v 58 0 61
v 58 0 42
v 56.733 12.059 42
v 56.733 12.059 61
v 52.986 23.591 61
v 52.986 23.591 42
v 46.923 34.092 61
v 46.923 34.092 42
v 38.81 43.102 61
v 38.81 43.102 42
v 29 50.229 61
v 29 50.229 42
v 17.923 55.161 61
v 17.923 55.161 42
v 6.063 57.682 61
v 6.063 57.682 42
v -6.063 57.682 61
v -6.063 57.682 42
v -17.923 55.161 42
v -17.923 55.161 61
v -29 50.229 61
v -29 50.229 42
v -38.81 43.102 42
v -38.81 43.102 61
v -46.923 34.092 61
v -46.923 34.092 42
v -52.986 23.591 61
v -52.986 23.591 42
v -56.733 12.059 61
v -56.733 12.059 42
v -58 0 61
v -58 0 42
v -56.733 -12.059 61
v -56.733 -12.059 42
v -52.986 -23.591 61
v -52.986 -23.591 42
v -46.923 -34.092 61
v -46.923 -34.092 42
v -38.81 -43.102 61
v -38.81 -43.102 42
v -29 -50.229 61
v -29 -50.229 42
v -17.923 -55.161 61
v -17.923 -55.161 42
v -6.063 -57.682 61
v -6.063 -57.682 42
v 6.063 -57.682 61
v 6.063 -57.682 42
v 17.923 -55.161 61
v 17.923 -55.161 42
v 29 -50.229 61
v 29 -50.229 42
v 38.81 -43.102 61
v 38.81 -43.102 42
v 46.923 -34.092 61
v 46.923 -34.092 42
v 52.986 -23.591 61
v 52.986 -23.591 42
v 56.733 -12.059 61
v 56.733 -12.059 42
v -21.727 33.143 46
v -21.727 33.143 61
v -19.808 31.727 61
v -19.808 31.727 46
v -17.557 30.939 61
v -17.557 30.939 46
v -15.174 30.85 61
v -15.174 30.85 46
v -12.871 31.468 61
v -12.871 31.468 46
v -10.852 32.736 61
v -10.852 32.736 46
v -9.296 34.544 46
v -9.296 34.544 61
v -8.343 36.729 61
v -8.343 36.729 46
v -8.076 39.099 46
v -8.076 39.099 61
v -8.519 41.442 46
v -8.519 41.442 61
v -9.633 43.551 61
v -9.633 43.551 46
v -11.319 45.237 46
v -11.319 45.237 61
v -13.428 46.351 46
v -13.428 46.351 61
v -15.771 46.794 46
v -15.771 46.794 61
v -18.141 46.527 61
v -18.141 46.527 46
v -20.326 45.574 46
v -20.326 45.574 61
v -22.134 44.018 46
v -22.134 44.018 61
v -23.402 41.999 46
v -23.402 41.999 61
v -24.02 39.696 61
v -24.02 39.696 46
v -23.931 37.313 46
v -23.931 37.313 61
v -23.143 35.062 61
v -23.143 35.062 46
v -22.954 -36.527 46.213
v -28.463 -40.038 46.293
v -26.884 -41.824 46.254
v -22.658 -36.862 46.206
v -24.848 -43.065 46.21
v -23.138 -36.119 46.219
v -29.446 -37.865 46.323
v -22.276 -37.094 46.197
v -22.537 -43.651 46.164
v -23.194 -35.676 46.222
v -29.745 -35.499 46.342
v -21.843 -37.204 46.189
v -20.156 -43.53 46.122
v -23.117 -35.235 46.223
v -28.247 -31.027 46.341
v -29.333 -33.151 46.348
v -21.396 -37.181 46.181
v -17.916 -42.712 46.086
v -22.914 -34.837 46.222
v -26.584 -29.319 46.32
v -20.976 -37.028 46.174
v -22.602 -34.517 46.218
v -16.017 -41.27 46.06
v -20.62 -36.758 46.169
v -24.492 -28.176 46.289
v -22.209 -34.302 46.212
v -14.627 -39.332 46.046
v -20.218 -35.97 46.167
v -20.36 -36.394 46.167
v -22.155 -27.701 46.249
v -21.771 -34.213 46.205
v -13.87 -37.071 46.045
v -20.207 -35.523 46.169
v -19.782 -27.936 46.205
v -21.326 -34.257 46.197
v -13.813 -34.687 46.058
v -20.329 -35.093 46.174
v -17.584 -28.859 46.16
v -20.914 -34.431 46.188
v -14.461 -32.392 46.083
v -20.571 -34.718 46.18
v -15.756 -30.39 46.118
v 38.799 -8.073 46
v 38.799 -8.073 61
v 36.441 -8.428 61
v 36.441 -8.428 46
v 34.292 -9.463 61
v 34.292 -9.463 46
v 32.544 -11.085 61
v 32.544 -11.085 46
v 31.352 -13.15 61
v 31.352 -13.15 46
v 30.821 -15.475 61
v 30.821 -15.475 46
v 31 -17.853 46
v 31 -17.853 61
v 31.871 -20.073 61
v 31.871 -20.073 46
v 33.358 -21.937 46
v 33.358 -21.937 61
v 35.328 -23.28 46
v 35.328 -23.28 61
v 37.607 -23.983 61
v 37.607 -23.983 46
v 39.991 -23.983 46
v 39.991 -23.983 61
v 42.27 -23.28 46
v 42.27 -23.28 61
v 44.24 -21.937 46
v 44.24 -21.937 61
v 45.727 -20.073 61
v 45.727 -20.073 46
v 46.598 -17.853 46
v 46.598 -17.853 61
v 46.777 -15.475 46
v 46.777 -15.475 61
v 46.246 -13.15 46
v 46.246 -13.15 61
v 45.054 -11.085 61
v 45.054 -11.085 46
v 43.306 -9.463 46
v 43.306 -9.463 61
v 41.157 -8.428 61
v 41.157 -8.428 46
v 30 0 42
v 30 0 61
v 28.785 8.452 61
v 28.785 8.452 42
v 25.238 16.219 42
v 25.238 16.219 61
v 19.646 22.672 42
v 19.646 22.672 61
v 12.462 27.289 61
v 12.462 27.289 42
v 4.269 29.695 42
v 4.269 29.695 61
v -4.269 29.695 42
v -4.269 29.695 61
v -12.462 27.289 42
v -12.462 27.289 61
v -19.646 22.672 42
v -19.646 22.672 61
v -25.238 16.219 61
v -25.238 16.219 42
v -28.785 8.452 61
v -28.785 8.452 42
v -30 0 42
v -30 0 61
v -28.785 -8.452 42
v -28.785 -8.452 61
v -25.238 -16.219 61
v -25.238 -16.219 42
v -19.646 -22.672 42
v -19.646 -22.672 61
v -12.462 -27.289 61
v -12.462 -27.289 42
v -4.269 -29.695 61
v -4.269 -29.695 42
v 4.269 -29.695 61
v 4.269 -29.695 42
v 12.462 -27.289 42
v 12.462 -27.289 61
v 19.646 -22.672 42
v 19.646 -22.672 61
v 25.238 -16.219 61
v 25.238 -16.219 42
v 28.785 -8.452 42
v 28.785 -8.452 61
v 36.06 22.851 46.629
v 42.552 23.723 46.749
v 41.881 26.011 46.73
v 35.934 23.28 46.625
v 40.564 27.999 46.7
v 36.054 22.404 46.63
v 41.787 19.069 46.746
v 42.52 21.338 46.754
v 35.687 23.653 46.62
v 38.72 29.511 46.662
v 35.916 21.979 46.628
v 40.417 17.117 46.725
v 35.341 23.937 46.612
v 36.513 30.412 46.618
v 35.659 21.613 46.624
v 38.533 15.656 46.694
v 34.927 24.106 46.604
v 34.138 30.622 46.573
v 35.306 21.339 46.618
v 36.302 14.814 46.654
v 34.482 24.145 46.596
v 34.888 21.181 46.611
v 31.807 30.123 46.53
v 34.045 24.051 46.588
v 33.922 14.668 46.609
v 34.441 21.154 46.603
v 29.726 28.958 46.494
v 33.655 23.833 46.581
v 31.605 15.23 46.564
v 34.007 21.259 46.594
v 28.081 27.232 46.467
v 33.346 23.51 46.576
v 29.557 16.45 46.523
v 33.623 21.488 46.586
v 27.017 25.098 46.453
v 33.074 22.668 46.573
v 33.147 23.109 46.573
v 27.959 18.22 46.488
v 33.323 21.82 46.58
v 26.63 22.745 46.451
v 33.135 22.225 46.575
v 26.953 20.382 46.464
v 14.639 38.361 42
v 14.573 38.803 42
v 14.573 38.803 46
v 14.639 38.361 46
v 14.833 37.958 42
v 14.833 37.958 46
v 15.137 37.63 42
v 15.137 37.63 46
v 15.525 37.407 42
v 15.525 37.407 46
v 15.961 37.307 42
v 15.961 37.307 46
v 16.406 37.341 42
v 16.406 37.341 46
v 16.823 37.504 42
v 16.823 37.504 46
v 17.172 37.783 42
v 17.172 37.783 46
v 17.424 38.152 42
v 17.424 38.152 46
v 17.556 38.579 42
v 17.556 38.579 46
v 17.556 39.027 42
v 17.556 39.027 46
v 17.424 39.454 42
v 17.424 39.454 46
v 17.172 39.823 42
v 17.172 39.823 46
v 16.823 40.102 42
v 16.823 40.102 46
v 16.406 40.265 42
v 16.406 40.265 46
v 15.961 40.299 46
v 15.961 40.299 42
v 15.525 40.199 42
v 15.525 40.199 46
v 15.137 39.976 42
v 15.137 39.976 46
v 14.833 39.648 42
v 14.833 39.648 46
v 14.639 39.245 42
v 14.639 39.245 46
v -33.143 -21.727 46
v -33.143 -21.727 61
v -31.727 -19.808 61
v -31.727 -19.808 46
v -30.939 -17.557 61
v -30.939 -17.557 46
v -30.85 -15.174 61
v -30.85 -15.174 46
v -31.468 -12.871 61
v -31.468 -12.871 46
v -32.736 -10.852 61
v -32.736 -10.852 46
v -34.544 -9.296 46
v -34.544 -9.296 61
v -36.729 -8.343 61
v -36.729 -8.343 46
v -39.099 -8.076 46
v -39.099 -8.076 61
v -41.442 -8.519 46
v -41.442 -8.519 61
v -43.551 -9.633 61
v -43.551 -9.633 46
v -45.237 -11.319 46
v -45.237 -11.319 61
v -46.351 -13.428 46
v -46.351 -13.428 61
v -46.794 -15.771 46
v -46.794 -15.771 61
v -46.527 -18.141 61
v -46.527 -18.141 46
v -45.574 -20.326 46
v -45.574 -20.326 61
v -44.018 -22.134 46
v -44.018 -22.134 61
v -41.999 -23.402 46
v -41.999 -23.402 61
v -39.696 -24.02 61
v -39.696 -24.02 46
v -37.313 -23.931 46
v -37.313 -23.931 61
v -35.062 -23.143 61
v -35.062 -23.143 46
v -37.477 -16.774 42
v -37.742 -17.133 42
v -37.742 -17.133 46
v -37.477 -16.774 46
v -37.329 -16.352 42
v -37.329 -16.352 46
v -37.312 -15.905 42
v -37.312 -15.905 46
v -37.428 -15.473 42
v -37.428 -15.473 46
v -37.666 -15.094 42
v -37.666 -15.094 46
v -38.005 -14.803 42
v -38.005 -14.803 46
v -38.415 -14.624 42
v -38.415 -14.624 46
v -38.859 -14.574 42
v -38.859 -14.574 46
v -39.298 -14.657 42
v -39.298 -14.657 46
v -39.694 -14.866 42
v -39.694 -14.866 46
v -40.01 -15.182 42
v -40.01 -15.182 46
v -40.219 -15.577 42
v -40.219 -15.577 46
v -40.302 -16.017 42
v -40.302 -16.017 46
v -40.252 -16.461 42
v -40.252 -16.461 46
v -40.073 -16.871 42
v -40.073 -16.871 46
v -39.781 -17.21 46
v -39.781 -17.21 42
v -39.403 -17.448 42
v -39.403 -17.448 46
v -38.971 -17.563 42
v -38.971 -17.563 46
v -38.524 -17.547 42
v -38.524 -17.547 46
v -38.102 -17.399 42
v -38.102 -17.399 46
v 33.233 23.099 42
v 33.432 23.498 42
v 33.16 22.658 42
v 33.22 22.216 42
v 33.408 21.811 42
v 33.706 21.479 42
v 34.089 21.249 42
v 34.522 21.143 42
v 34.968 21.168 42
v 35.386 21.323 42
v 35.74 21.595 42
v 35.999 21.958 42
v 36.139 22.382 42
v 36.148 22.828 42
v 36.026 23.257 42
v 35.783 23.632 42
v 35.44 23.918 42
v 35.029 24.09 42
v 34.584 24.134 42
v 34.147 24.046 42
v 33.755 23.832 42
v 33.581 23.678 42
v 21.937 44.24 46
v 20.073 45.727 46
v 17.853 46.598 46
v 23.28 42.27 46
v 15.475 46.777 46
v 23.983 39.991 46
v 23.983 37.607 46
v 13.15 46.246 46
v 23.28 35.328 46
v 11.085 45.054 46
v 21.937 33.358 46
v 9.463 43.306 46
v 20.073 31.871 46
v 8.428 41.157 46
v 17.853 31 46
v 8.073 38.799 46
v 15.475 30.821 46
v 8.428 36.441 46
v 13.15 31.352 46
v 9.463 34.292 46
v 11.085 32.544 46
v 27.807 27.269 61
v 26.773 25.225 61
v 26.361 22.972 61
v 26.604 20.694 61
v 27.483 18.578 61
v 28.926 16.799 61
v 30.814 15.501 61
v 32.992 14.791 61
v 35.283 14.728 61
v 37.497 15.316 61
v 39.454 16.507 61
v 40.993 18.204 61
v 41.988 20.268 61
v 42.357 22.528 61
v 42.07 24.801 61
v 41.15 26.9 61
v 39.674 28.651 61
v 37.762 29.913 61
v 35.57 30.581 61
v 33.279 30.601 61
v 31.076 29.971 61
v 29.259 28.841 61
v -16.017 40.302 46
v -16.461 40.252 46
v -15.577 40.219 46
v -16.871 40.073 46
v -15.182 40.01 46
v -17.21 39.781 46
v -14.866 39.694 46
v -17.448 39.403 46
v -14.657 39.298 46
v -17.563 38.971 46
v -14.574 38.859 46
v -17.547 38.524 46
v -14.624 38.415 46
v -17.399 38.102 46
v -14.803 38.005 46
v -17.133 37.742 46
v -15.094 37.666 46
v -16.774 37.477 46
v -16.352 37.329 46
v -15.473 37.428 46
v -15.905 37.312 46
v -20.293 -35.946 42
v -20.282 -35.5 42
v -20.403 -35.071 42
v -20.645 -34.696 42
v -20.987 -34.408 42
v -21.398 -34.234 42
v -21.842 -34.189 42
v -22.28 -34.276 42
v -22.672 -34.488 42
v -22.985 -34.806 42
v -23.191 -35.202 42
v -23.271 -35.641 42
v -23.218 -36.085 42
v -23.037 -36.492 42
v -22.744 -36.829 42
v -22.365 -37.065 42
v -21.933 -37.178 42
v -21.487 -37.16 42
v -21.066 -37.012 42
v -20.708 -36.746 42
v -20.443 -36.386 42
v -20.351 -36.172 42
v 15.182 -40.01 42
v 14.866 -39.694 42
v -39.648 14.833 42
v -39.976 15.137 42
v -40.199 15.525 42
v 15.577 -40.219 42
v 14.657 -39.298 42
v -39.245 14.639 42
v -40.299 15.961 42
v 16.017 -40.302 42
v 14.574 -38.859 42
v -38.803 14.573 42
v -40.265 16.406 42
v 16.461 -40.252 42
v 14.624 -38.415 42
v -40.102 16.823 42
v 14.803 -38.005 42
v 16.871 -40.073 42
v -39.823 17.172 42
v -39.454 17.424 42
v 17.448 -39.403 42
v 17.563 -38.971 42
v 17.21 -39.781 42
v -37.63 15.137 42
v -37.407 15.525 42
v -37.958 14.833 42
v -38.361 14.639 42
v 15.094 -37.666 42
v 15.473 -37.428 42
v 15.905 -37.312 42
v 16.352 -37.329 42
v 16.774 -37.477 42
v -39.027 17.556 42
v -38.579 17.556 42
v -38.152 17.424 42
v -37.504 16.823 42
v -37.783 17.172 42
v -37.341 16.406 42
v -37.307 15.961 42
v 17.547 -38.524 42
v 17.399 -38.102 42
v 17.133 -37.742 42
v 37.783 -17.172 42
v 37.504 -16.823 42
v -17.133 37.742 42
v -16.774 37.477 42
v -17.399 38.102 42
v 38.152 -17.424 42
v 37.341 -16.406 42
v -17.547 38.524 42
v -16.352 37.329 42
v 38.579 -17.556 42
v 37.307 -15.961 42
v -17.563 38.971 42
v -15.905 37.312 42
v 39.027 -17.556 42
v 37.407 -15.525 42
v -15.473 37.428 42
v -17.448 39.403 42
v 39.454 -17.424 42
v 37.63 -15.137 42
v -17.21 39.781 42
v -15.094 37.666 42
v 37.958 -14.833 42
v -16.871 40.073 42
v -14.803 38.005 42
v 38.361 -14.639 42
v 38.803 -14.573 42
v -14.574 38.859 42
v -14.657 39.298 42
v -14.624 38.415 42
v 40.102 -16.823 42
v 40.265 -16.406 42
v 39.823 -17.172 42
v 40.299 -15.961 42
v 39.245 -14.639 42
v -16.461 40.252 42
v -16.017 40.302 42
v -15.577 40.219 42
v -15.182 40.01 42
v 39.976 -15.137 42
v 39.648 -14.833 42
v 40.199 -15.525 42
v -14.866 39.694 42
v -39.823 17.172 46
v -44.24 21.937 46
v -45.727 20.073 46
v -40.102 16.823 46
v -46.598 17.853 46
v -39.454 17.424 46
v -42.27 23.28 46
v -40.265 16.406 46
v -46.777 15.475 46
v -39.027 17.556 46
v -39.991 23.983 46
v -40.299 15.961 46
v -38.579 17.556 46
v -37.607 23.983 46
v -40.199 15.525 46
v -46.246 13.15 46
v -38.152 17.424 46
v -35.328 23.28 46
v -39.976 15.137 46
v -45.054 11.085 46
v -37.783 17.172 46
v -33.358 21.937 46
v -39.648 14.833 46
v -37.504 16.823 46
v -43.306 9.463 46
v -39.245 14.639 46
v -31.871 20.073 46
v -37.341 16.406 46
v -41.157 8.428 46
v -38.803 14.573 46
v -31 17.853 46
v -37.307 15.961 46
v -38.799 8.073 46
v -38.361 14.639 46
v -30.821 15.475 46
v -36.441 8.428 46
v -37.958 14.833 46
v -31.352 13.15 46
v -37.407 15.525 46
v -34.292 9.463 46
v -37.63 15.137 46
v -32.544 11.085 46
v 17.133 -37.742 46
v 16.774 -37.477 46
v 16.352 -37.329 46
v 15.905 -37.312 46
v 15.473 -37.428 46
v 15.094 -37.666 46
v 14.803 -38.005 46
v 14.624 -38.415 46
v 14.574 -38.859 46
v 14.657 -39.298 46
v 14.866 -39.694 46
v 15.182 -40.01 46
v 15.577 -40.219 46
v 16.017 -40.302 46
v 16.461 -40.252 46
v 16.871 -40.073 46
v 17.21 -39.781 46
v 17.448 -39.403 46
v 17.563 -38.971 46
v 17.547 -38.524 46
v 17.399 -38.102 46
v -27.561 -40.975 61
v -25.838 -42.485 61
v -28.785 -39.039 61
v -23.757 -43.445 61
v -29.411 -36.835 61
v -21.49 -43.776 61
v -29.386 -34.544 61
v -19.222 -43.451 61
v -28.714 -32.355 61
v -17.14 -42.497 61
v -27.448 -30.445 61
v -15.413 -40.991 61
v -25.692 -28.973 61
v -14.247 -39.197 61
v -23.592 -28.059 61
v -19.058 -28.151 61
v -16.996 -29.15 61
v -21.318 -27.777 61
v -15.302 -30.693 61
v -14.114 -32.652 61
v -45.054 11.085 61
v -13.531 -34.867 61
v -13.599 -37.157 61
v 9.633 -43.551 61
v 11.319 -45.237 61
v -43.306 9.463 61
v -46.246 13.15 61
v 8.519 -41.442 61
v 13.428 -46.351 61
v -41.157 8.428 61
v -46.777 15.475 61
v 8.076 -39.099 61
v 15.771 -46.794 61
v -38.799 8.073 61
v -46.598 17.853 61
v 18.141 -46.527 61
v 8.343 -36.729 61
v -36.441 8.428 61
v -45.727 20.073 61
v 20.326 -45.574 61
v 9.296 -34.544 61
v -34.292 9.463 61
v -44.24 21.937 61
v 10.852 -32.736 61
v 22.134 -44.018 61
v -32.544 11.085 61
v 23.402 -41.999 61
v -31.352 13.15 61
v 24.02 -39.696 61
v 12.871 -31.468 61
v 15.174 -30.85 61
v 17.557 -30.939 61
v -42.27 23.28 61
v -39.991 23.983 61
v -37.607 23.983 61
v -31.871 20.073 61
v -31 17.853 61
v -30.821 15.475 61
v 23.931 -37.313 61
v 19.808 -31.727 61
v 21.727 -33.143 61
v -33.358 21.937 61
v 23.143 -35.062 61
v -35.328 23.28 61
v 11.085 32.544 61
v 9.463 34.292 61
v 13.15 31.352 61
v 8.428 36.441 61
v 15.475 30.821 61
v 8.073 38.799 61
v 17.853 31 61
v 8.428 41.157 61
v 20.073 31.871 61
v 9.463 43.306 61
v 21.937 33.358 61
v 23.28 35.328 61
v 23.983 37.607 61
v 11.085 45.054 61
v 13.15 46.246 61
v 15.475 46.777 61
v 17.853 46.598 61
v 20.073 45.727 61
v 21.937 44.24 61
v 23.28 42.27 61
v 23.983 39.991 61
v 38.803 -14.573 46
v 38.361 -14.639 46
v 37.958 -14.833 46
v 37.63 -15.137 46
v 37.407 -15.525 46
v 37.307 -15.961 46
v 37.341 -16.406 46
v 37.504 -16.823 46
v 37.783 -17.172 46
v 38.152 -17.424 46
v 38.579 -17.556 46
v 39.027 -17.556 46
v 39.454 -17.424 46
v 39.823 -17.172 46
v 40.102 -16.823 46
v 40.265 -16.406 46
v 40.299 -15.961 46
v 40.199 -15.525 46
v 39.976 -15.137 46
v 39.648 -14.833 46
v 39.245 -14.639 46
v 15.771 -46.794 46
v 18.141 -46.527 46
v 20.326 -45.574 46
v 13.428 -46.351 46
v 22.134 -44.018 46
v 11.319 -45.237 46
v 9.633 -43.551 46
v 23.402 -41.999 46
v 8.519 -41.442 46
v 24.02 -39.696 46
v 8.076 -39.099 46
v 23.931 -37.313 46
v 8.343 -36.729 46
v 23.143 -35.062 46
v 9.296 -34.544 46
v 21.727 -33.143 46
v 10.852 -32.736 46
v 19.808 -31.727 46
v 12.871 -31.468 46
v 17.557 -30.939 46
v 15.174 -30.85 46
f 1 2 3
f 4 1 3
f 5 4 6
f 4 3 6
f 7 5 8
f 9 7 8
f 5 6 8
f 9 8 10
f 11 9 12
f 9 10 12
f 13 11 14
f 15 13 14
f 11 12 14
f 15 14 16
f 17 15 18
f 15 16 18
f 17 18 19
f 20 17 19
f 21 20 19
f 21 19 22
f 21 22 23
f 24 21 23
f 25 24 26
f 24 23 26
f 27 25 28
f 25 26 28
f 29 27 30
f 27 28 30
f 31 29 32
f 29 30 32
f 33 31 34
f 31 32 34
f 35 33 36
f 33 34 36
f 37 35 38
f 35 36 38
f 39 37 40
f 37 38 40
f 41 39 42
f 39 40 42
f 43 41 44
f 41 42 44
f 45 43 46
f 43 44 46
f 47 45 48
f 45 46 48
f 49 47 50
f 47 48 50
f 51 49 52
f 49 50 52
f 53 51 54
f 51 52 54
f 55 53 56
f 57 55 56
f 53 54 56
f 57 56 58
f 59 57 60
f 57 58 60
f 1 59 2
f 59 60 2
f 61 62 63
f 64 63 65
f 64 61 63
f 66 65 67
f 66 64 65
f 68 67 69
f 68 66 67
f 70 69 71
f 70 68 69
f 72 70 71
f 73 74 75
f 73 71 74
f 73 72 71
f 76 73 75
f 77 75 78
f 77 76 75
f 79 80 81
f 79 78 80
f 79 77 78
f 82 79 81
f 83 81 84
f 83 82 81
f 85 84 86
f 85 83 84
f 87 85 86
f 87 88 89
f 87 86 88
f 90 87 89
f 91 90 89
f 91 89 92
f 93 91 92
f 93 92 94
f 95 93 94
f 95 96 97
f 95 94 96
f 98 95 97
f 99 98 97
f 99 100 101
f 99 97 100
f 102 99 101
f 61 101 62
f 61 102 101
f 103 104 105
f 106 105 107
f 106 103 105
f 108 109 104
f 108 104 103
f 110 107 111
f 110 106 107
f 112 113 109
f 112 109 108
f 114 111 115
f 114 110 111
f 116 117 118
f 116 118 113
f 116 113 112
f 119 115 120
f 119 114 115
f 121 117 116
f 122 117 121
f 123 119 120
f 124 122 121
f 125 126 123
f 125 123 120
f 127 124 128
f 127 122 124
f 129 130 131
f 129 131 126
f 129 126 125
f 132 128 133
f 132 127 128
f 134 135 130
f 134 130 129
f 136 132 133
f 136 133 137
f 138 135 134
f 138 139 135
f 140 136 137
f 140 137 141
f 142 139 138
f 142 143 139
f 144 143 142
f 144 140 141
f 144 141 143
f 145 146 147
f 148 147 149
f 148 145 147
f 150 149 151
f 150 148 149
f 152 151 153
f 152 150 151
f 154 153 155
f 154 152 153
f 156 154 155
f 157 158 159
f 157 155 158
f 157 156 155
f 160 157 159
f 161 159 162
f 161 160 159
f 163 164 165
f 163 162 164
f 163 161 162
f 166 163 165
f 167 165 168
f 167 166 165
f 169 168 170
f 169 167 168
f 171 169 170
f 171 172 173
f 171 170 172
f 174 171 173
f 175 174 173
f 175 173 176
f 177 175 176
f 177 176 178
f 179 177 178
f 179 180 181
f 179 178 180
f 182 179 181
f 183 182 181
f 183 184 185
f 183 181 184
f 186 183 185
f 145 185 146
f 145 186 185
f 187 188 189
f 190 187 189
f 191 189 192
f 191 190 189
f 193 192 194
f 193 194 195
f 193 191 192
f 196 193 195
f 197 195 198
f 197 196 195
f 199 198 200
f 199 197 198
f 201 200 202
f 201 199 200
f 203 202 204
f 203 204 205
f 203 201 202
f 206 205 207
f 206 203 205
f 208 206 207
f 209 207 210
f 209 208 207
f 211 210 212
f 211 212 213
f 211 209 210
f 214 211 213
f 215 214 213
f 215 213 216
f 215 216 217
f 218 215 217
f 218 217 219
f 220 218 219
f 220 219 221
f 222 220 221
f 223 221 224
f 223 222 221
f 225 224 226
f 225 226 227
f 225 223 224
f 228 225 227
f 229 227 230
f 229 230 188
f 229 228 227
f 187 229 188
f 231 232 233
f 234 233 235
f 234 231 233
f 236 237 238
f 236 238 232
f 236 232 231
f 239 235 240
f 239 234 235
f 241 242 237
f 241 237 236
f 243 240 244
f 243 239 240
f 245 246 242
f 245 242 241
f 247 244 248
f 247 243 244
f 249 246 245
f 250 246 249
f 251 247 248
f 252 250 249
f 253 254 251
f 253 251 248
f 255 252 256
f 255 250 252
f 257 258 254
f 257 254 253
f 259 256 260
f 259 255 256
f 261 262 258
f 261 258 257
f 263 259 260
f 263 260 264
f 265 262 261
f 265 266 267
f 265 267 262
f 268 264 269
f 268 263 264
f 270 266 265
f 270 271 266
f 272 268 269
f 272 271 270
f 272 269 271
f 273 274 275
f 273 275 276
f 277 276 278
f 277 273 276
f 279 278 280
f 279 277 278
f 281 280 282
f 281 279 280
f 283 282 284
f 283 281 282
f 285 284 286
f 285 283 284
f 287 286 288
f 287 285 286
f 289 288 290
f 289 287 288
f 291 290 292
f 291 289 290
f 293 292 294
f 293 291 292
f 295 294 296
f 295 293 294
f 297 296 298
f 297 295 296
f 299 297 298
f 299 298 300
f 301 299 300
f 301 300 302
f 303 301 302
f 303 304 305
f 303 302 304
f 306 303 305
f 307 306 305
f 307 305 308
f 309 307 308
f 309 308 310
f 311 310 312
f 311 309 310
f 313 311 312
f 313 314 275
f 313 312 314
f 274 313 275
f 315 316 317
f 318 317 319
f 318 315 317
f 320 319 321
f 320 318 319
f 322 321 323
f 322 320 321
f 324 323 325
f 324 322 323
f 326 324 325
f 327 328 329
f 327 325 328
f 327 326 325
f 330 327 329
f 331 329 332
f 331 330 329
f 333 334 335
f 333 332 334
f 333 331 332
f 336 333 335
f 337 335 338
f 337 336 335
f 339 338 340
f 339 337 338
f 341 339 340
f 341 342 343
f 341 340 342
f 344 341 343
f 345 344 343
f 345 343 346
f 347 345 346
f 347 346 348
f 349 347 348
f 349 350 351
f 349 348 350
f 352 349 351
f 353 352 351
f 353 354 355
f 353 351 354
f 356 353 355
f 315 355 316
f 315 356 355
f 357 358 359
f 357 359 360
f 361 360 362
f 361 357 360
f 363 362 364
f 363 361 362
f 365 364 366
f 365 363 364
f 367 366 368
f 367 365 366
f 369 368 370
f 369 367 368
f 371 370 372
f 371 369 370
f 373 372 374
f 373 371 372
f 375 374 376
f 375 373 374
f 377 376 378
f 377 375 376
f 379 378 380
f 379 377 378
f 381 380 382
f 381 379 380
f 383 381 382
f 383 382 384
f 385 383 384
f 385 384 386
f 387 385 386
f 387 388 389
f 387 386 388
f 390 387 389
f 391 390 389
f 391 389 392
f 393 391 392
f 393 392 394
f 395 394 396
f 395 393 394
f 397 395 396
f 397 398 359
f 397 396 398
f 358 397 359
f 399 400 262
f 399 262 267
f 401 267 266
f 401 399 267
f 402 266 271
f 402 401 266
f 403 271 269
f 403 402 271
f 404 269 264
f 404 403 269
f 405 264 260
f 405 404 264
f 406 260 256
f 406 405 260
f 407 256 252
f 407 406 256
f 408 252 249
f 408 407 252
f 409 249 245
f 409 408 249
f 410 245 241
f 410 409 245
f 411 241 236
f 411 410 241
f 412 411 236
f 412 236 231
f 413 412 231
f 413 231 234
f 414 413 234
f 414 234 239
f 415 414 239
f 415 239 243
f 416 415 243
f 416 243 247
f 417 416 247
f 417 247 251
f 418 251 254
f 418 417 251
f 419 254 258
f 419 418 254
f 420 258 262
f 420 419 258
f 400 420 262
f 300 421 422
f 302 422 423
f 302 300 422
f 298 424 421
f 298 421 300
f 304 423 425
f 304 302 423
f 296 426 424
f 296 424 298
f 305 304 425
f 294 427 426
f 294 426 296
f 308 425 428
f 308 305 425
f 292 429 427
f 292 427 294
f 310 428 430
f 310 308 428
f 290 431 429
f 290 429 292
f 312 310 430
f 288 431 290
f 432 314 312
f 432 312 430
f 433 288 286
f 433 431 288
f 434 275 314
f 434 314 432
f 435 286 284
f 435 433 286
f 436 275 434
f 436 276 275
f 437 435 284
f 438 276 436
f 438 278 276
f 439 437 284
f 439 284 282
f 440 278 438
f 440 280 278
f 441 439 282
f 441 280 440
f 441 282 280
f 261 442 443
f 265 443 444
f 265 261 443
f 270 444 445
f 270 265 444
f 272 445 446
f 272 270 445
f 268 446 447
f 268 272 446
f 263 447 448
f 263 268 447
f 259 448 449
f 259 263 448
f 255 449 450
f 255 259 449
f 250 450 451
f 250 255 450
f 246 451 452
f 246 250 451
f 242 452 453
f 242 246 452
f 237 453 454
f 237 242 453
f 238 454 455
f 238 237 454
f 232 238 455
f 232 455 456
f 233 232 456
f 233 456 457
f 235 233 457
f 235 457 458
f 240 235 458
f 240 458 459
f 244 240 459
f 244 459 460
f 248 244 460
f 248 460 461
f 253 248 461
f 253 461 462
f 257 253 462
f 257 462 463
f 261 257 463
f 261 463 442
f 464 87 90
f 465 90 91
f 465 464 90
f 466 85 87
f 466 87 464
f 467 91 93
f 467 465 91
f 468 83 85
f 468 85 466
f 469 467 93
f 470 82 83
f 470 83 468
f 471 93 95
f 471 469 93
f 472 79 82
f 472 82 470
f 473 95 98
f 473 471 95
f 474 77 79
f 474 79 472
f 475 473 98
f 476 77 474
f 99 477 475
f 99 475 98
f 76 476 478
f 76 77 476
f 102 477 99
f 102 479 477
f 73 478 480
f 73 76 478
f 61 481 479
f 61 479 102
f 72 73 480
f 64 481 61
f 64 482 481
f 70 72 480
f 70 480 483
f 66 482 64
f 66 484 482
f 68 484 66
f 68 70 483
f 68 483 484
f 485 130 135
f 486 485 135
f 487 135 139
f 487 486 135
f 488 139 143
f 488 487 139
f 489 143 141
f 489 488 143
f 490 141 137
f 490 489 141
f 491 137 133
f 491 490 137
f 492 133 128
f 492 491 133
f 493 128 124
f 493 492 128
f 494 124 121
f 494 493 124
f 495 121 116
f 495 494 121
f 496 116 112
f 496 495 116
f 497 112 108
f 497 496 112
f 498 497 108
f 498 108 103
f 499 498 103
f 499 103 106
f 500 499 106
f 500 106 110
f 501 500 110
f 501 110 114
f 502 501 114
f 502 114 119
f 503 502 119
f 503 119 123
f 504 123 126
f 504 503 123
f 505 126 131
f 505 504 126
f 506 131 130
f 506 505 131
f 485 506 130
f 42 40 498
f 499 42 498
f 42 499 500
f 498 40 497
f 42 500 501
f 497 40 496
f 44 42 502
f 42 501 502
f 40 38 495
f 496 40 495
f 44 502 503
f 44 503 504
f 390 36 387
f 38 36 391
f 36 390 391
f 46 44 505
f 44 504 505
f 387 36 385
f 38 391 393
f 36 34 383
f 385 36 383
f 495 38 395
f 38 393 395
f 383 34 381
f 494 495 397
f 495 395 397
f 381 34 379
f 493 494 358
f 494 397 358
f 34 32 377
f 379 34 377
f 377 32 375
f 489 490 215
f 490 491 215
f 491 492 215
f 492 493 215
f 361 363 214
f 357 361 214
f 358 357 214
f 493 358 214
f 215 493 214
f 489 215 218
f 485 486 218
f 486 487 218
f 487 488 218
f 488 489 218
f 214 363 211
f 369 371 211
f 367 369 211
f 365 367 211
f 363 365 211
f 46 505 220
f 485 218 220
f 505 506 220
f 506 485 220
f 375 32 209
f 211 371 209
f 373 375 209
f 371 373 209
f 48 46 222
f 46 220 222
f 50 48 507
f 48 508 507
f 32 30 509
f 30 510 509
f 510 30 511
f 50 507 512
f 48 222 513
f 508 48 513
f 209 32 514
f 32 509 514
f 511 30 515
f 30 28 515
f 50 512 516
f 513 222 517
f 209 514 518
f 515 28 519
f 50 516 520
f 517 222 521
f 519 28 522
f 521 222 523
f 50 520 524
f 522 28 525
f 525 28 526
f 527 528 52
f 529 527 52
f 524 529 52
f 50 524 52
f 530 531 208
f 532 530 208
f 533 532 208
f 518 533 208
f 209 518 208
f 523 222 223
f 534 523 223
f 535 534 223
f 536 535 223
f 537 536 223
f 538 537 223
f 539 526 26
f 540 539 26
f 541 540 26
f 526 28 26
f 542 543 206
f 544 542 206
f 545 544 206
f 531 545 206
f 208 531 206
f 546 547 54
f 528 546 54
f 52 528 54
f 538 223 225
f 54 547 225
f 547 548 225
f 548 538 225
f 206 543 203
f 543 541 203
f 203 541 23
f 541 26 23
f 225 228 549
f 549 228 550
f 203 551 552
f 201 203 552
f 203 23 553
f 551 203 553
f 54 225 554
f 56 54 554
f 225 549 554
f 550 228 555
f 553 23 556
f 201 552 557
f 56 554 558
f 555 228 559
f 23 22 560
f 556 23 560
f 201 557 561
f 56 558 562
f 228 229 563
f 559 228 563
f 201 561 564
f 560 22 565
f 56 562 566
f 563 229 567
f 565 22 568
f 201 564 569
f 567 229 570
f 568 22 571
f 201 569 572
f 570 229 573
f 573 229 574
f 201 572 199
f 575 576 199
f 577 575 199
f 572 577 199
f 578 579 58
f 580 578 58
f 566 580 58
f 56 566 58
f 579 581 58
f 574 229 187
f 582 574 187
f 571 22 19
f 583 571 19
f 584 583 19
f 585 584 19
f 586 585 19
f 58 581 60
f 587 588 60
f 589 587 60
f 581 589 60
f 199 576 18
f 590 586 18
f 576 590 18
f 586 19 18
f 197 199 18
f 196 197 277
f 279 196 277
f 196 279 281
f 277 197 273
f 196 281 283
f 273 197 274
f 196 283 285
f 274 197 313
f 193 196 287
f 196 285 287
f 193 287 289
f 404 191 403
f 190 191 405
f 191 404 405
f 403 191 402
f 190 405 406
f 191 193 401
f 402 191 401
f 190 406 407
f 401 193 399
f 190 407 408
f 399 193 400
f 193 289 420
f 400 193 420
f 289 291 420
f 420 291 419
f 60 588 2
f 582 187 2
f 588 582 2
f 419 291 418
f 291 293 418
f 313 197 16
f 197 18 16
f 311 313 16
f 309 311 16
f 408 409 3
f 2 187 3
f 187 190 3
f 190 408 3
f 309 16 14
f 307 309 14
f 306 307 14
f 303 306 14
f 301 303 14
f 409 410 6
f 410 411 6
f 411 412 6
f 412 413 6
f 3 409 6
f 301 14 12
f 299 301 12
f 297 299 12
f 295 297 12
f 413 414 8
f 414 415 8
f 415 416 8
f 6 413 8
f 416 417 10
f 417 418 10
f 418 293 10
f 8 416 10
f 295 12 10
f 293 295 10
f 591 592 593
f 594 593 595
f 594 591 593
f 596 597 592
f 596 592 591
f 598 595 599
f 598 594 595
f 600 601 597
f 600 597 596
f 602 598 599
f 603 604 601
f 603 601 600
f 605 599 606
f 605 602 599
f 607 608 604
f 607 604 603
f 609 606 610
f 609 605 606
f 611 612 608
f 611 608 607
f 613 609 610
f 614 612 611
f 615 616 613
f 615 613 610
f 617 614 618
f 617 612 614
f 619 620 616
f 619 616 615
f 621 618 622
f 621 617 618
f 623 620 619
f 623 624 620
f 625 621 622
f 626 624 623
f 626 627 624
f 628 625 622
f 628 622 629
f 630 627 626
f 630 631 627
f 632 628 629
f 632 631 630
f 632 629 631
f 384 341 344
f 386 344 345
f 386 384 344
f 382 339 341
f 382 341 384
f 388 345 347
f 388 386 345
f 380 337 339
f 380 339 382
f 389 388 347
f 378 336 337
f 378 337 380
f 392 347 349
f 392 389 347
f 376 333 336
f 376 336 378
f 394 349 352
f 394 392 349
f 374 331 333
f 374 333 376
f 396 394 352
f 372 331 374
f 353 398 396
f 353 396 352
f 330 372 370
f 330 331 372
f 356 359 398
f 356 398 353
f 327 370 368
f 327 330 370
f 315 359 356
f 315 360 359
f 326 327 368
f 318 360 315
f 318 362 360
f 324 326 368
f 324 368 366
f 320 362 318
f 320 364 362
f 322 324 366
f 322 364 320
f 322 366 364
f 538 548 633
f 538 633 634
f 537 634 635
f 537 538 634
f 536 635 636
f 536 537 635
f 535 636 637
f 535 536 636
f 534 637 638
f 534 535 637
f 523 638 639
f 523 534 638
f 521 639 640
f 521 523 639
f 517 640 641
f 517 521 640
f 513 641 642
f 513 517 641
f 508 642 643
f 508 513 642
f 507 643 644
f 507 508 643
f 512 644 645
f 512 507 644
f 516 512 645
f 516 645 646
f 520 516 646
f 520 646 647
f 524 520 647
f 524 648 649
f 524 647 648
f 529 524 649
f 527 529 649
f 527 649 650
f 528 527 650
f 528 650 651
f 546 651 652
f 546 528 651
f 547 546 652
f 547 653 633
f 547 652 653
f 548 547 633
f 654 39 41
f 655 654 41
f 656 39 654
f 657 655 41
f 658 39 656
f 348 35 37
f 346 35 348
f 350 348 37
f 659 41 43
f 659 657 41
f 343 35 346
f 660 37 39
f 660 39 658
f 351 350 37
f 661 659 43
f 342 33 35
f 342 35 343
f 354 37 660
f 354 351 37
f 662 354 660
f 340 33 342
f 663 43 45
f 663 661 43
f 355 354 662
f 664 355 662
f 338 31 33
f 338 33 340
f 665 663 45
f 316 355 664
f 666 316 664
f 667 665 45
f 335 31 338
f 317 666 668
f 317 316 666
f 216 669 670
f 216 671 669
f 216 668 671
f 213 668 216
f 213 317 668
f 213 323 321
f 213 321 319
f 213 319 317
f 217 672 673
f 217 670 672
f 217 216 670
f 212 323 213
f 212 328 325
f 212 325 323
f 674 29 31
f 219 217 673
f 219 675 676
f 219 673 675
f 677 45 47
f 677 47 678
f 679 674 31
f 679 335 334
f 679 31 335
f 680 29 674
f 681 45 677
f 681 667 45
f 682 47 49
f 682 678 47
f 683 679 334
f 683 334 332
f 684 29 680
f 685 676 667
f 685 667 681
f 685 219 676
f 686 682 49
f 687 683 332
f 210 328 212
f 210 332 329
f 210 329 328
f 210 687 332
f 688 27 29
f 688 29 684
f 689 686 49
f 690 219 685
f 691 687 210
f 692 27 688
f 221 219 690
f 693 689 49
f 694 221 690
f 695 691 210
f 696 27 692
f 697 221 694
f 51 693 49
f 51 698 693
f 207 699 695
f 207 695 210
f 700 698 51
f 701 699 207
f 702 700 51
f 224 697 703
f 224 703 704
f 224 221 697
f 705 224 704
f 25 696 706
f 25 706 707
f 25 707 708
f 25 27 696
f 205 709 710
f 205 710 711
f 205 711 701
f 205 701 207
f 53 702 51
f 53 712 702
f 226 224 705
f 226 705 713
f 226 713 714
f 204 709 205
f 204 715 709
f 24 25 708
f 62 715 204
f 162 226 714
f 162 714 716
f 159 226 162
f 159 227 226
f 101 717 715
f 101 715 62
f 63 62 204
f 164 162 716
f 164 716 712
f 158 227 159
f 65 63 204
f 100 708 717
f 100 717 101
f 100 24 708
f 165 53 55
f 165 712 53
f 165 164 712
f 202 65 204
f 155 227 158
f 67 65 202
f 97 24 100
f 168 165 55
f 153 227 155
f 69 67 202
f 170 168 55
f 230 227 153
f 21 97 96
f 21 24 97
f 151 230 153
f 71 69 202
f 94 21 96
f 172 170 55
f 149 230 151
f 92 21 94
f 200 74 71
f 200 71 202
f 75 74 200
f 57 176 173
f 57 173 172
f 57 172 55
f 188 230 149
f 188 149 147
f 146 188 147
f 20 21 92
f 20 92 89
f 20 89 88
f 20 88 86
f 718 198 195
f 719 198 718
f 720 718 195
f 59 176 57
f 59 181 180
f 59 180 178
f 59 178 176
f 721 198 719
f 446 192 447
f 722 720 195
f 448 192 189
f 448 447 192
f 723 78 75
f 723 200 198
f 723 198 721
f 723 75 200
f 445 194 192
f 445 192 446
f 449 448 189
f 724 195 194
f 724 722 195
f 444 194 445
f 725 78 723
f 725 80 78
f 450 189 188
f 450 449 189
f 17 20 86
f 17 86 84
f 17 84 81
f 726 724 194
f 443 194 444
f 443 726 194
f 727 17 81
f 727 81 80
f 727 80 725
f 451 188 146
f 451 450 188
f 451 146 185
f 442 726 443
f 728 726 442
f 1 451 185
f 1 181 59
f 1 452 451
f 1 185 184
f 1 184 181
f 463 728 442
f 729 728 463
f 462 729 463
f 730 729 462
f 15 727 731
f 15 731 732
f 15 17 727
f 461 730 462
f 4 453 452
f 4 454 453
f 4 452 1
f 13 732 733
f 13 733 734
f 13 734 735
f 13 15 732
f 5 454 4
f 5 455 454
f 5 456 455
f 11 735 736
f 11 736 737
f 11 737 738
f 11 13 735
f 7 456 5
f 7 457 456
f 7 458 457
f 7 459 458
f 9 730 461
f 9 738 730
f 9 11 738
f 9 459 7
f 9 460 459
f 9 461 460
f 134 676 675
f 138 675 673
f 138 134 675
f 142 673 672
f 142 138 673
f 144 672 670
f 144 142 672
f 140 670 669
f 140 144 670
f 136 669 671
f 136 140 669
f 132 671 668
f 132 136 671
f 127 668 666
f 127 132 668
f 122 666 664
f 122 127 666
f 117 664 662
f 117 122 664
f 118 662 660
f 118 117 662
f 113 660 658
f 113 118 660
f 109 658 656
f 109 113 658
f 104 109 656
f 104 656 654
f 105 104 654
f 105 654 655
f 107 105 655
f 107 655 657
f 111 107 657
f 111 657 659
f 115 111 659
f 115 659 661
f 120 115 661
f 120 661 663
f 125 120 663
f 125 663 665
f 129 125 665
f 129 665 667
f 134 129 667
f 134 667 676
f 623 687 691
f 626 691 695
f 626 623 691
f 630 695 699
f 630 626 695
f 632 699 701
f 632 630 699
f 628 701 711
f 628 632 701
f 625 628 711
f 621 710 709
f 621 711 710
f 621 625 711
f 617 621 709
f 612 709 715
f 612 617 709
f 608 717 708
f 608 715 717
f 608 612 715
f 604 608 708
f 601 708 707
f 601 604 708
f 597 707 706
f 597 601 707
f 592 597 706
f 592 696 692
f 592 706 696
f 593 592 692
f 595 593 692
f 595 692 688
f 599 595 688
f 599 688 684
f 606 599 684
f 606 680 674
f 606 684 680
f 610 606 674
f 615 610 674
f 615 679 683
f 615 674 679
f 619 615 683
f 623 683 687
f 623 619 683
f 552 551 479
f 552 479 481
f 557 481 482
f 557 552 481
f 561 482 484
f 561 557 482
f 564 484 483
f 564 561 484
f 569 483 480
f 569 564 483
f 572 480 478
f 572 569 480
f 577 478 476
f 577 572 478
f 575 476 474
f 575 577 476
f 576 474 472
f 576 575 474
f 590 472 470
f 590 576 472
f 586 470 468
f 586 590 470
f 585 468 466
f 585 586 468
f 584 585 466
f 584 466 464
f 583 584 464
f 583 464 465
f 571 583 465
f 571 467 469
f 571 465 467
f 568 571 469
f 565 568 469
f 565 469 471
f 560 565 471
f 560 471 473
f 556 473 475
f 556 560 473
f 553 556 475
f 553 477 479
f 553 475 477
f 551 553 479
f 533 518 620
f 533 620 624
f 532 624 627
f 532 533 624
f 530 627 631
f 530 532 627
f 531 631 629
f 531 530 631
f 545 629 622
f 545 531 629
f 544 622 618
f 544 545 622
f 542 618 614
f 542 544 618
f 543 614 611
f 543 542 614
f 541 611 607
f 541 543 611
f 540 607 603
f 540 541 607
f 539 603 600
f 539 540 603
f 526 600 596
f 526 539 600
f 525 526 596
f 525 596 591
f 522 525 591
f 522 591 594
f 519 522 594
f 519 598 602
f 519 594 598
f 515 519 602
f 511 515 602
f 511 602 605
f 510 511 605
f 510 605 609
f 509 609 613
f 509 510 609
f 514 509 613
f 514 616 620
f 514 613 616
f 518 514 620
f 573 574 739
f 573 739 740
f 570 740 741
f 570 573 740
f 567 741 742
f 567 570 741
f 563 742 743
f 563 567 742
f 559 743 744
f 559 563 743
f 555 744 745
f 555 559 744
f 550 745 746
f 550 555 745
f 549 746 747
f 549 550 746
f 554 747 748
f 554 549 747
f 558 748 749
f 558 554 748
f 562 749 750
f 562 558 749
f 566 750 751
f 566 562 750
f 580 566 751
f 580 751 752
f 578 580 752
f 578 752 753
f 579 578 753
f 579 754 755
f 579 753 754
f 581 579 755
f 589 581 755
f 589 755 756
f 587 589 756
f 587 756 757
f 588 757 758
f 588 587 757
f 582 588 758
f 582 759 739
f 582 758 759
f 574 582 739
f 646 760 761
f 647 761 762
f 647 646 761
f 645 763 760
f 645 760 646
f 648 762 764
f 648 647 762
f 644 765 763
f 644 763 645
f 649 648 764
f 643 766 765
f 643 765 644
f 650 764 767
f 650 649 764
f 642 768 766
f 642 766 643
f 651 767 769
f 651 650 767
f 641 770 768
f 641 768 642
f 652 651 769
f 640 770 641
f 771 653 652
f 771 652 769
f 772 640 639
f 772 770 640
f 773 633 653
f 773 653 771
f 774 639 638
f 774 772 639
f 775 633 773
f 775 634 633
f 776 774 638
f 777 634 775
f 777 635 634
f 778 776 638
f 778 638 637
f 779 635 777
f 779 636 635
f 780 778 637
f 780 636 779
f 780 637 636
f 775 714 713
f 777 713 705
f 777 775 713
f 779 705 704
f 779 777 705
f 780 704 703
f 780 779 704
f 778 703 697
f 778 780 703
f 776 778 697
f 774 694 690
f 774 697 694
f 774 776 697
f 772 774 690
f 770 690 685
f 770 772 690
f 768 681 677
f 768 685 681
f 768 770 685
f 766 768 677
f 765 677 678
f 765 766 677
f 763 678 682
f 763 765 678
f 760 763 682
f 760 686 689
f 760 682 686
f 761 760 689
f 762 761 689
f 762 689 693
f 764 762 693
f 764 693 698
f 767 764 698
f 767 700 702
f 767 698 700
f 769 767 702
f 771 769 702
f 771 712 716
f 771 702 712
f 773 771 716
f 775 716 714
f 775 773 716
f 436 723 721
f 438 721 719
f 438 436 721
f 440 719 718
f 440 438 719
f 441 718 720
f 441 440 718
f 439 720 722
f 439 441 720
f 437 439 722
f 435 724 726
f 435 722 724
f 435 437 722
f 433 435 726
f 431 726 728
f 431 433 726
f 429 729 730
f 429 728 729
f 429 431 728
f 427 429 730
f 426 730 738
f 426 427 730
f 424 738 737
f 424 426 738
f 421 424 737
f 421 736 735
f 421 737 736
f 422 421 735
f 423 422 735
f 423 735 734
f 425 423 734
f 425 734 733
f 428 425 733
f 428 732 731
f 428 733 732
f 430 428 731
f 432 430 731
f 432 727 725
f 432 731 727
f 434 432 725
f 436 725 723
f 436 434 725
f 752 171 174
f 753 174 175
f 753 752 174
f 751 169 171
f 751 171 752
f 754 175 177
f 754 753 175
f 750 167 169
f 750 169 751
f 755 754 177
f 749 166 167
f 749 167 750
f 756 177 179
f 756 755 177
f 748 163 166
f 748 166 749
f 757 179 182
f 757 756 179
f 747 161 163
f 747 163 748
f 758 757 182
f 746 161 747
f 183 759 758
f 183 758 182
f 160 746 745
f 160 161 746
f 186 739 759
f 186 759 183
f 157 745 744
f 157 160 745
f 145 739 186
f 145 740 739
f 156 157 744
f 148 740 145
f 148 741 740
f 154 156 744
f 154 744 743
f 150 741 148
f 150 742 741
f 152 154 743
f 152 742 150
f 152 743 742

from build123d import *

# Parameters (mm, degrees)
CYLINDER430_R               = 1.5
CYLINDER430_DEPTH           = 100
CYLINDER432_R               = 1.5
CYLINDER432_DEPTH           = 100
CYLINDER432_ROLL_ANGLE      = -0.500355
CYLINDER432_PITCH_ANGLE     = 0.967193
CYLINDER432_PLACEMENT_ANGLE = 144.93646
CYLINDER434_R               = 1.5
CYLINDER434_DEPTH           = 100
CYLINDER436_R               = 1.5
CYLINDER436_DEPTH           = 100
CYLINDER436_PLACEMENT_ANGLE = 225
CYLINDER438_R               = 1.5
CYLINDER438_DEPTH           = 100
CYLINDER440_R               = 1.5
CYLINDER440_DEPTH           = 100
CYLINDER440_PLACEMENT_ANGLE = 45
CYLINDER442_R               = 1.5
CYLINDER442_DEPTH           = 100
CYLINDER442_ROLL_ANGLE      = 0.146073
CYLINDER442_PITCH_ANGLE     = 1.079101
CYLINDER442_PLACEMENT_ANGLE = -9.939308
CYLINDER428_R               = 1.5
CYLINDER428_DEPTH           = 100
CYLINDER428_PLACEMENT_ANGLE = 45
CYLINDER439_R               = 8
CYLINDER439_DEPTH           = 18
CYLINDER437_R               = 8
CYLINDER437_DEPTH           = 18
CYLINDER437_PLACEMENT_ANGLE = 225
CYLINDER435_R               = 8
CYLINDER435_DEPTH           = 18
CYLINDER433_R               = 8
CYLINDER433_DEPTH           = 18
CYLINDER433_ROLL_ANGLE      = -0.500355
CYLINDER433_PITCH_ANGLE     = 0.967193
CYLINDER433_PLACEMENT_ANGLE = 144.93646
CYLINDER431_R               = 8
CYLINDER431_DEPTH           = 18
CYLINDER429_R               = 8
CYLINDER429_DEPTH           = 18
CYLINDER429_PLACEMENT_ANGLE = 45
CYLINDER443_R               = 8
CYLINDER443_DEPTH           = 18
CYLINDER443_ROLL_ANGLE      = 0.146073
CYLINDER443_PITCH_ANGLE     = 1.079101
CYLINDER443_PLACEMENT_ANGLE = -9.939308
CYLINDER441_R               = 8
CYLINDER441_DEPTH           = 18
CYLINDER441_PLACEMENT_ANGLE = 45
TUBE022_R                   = 58
TUBE022_R_2                 = 30
TUBE022_DEPTH               = 19


with BuildPart() as v_lec430:
    # Cylinder430 → Cylinder430 (new body)
    with BuildSketch(Plane(origin=(38.80294, -16.072704, 0), x_dir=(0, 1, 0), z_dir=(0, 0, 1))):
        Circle(CYLINDER430_R)
    extrude(amount=CYLINDER430_DEPTH)


with BuildPart() as v_lec432:
    # Cylinder432 → Cylinder432 (new body)
    with BuildSketch(Plane.XY):
        Circle(CYLINDER432_R)
    extrude(amount=CYLINDER432_DEPTH)


with BuildPart() as v_lec432_1:
    # Cylinder432 roll: moved
    add(v_lec432.part.rotate(Axis((0, 0, 0), (1, 0, 0)), CYLINDER432_ROLL_ANGLE))


with BuildPart() as v_lec432_2:
    # Cylinder432 pitch: moved
    add(v_lec432_1.part.rotate(Axis((0, 0, 0), (0, 1, 0)), CYLINDER432_PITCH_ANGLE))


with BuildPart() as v_lec432_3:
    # Cylinder432 placement: moved
    add(v_lec432_2.part.moved(Location((35.440039, 22.530677, 0.610113))).rotate(Axis((35.440039, 22.530677, 0.610113), (0, 0, 1)), CYLINDER432_PLACEMENT_ANGLE))


with BuildPart() as v_lec434:
    # Cylinder434 → Cylinder434 (new body)
    with BuildSketch(Plane(origin=(16.072704, 38.80294, 0), x_dir=(-1, 0, 0), z_dir=(0, 0, 1))):
        Circle(CYLINDER434_R)
    extrude(amount=CYLINDER434_DEPTH)


with BuildPart() as v_lec436:
    # Cylinder436 → Cylinder436 (new body)
    with BuildSketch(Plane.XY):
        Circle(CYLINDER436_R)
    extrude(amount=CYLINDER436_DEPTH)


with BuildPart() as v_lec436_1:
    # Cylinder436 placement: moved
    add(v_lec436.part.moved(Location((-16.072704, 38.80294, 0))).rotate(Axis((-16.072704, 38.80294, 0), (0, 0, 1)), CYLINDER436_PLACEMENT_ANGLE))


with BuildPart() as v_lec438:
    # Cylinder438 → Cylinder438 (new body)
    with BuildSketch(Plane(origin=(-38.80294, 16.072704, 0), x_dir=(0, -1, 0), z_dir=(0, 0, 1))):
        Circle(CYLINDER438_R)
    extrude(amount=CYLINDER438_DEPTH)


with BuildPart() as v_lec440:
    # Cylinder440 → Cylinder440 (new body)
    with BuildSketch(Plane.XY):
        Circle(CYLINDER440_R)
    extrude(amount=CYLINDER440_DEPTH)


with BuildPart() as v_lec440_1:
    # Cylinder440 placement: moved
    add(v_lec440.part.moved(Location((-38.80294, -16.072704, 0))).rotate(Axis((-38.80294, -16.072704, 0), (0, 0, -1)), CYLINDER440_PLACEMENT_ANGLE))


with BuildPart() as v_lec442:
    # Cylinder442 → Cylinder442 (new body)
    with BuildSketch(Plane.XY):
        Circle(CYLINDER442_R)
    extrude(amount=CYLINDER442_DEPTH)


with BuildPart() as v_lec442_1:
    # Cylinder442 roll: moved
    add(v_lec442.part.rotate(Axis((0, 0, 0), (1, 0, 0)), CYLINDER442_ROLL_ANGLE))


with BuildPart() as v_lec442_2:
    # Cylinder442 pitch: moved
    add(v_lec442_1.part.rotate(Axis((0, 0, 0), (0, 1, 0)), CYLINDER442_PITCH_ANGLE))


with BuildPart() as v_lec442_3:
    # Cylinder442 placement: moved
    add(v_lec442_2.part.moved(Location((-22.528054, -35.446371, 0.203785))).rotate(Axis((-22.528054, -35.446371, 0.203785), (0, 0, 1)), CYLINDER442_PLACEMENT_ANGLE))


with BuildPart() as compound321:
    # Cylinder428 → Cylinder428 (new body)
    with BuildSketch(Plane.XY):
        Circle(CYLINDER428_R)
    extrude(amount=CYLINDER428_DEPTH)


with BuildPart() as compound321_1:
    # Cylinder428 placement: moved
    add(compound321.part.moved(Location((16.072704, -38.80294, 0))).rotate(Axis((16.072704, -38.80294, 0), (0, 0, 1)), CYLINDER428_PLACEMENT_ANGLE))

    # Compound321: union Válec430, Válec432, Válec434, Válec436, Válec438, Válec440, Válec442
    add(v_lec430.part)
    add(v_lec432_3.part)
    add(v_lec434.part)
    add(v_lec436_1.part)
    add(v_lec438.part)
    add(v_lec440_1.part)
    add(v_lec442_3.part)


with BuildPart() as v_lec439:
    # Cylinder439 → Cylinder439 (new body)
    with BuildSketch(Plane(origin=(-38.798949, 16.072537, 43), x_dir=(0, -1, 0), z_dir=(0, 0, 1))):
        Circle(CYLINDER439_R)
    extrude(amount=CYLINDER439_DEPTH)


with BuildPart() as v_lec437:
    # Cylinder437 → Cylinder437 (new body)
    with BuildSketch(Plane.XY):
        Circle(CYLINDER437_R)
    extrude(amount=CYLINDER437_DEPTH)


with BuildPart() as v_lec437_1:
    # Cylinder437 placement: moved
    add(v_lec437.part.moved(Location((-16.07, 38.8, 43))).rotate(Axis((-16.07, 38.8, 43), (0, 0, 1)), CYLINDER437_PLACEMENT_ANGLE))


with BuildPart() as v_lec435:
    # Cylinder435 → Cylinder435 (new body)
    with BuildSketch(Plane(origin=(16.072537, 38.798949, 43), x_dir=(-1, 0, 0), z_dir=(0, 0, 1))):
        Circle(CYLINDER435_R)
    extrude(amount=CYLINDER435_DEPTH)


with BuildPart() as v_lec433:
    # Cylinder433 → Cylinder433 (new body)
    with BuildSketch(Plane.XY):
        Circle(CYLINDER433_R)
    extrude(amount=CYLINDER433_DEPTH)


with BuildPart() as v_lec433_1:
    # Cylinder433 roll: moved
    add(v_lec433.part.rotate(Axis((0, 0, 0), (1, 0, 0)), CYLINDER433_ROLL_ANGLE))


with BuildPart() as v_lec433_2:
    # Cylinder433 pitch: moved
    add(v_lec433_1.part.rotate(Axis((0, 0, 0), (0, 1, 0)), CYLINDER433_PITCH_ANGLE))


with BuildPart() as v_lec433_3:
    # Cylinder433 placement: moved
    add(v_lec433_2.part.moved(Location((34.627801, 22.637113, 43.602309))).rotate(Axis((34.627801, 22.637113, 43.602309), (0, 0, 1)), CYLINDER433_PLACEMENT_ANGLE))


with BuildPart() as v_lec431:
    # Cylinder431 → Cylinder431 (new body)
    with BuildSketch(Plane(origin=(38.798949, -16.072537, 43), x_dir=(0, 1, 0), z_dir=(0, 0, 1))):
        Circle(CYLINDER431_R)
    extrude(amount=CYLINDER431_DEPTH)


with BuildPart() as v_lec429:
    # Cylinder429 → Cylinder429 (new body)
    with BuildSketch(Plane.XY):
        Circle(CYLINDER429_R)
    extrude(amount=CYLINDER429_DEPTH)


with BuildPart() as v_lec429_1:
    # Cylinder429 placement: moved
    add(v_lec429.part.moved(Location((16.07, -38.8, 43))).rotate(Axis((16.07, -38.8, 43), (0, 0, 1)), CYLINDER429_PLACEMENT_ANGLE))


with BuildPart() as v_lec443:
    # Cylinder443 → Cylinder443 (new body)
    with BuildSketch(Plane.XY):
        Circle(CYLINDER443_R)
    extrude(amount=CYLINDER443_DEPTH)


with BuildPart() as v_lec443_1:
    # Cylinder443 roll: moved
    add(v_lec443.part.rotate(Axis((0, 0, 0), (1, 0, 0)), CYLINDER443_ROLL_ANGLE))


with BuildPart() as v_lec443_2:
    # Cylinder443 pitch: moved
    add(v_lec443_1.part.rotate(Axis((0, 0, 0), (0, 1, 0)), CYLINDER443_PITCH_ANGLE))


with BuildPart() as v_lec443_3:
    # Cylinder443 placement: moved
    add(v_lec443_2.part.moved(Location((-21.748471, -35.690226, 43.196026))).rotate(Axis((-21.748471, -35.690226, 43.196026), (0, 0, 1)), CYLINDER443_PLACEMENT_ANGLE))


with BuildPart() as compound323:
    # Cylinder441 → Cylinder441 (new body)
    with BuildSketch(Plane.XY):
        Circle(CYLINDER441_R)
    extrude(amount=CYLINDER441_DEPTH)


with BuildPart() as compound323_1:
    # Cylinder441 placement: moved
    add(compound323.part.moved(Location((-38.8, -16.07, 43))).rotate(Axis((-38.8, -16.07, 43), (0, 0, -1)), CYLINDER441_PLACEMENT_ANGLE))

    # Compound323: union Válec439, Válec437, Válec435, Válec433, Válec431, Válec429, Válec443
    add(v_lec439.part)
    add(v_lec437_1.part)
    add(v_lec435.part)
    add(v_lec433_3.part)
    add(v_lec431.part)
    add(v_lec429_1.part)
    add(v_lec443_3.part)


with BuildPart() as compound323_2:
    # Compound323 placement: moved
    add(compound323_1.part.moved(Location((0, 0, 3))))


with BuildPart() as bazovina_part_f_dirovina:
    # Tube022 → Tube022 (new body)
    with BuildSketch(Plane.XY.offset(42)):
        Circle(TUBE022_R)
        Circle(TUBE022_R_2, mode=Mode.SUBTRACT)
    extrude(amount=TUBE022_DEPTH)

    # Cut169: cut Compound323
    add(compound323_2.part, mode=Mode.SUBTRACT)

    # Cut170: cut Compound321
    add(compound321_1.part, mode=Mode.SUBTRACT)


solid = bazovina_part_f_dirovina.part
